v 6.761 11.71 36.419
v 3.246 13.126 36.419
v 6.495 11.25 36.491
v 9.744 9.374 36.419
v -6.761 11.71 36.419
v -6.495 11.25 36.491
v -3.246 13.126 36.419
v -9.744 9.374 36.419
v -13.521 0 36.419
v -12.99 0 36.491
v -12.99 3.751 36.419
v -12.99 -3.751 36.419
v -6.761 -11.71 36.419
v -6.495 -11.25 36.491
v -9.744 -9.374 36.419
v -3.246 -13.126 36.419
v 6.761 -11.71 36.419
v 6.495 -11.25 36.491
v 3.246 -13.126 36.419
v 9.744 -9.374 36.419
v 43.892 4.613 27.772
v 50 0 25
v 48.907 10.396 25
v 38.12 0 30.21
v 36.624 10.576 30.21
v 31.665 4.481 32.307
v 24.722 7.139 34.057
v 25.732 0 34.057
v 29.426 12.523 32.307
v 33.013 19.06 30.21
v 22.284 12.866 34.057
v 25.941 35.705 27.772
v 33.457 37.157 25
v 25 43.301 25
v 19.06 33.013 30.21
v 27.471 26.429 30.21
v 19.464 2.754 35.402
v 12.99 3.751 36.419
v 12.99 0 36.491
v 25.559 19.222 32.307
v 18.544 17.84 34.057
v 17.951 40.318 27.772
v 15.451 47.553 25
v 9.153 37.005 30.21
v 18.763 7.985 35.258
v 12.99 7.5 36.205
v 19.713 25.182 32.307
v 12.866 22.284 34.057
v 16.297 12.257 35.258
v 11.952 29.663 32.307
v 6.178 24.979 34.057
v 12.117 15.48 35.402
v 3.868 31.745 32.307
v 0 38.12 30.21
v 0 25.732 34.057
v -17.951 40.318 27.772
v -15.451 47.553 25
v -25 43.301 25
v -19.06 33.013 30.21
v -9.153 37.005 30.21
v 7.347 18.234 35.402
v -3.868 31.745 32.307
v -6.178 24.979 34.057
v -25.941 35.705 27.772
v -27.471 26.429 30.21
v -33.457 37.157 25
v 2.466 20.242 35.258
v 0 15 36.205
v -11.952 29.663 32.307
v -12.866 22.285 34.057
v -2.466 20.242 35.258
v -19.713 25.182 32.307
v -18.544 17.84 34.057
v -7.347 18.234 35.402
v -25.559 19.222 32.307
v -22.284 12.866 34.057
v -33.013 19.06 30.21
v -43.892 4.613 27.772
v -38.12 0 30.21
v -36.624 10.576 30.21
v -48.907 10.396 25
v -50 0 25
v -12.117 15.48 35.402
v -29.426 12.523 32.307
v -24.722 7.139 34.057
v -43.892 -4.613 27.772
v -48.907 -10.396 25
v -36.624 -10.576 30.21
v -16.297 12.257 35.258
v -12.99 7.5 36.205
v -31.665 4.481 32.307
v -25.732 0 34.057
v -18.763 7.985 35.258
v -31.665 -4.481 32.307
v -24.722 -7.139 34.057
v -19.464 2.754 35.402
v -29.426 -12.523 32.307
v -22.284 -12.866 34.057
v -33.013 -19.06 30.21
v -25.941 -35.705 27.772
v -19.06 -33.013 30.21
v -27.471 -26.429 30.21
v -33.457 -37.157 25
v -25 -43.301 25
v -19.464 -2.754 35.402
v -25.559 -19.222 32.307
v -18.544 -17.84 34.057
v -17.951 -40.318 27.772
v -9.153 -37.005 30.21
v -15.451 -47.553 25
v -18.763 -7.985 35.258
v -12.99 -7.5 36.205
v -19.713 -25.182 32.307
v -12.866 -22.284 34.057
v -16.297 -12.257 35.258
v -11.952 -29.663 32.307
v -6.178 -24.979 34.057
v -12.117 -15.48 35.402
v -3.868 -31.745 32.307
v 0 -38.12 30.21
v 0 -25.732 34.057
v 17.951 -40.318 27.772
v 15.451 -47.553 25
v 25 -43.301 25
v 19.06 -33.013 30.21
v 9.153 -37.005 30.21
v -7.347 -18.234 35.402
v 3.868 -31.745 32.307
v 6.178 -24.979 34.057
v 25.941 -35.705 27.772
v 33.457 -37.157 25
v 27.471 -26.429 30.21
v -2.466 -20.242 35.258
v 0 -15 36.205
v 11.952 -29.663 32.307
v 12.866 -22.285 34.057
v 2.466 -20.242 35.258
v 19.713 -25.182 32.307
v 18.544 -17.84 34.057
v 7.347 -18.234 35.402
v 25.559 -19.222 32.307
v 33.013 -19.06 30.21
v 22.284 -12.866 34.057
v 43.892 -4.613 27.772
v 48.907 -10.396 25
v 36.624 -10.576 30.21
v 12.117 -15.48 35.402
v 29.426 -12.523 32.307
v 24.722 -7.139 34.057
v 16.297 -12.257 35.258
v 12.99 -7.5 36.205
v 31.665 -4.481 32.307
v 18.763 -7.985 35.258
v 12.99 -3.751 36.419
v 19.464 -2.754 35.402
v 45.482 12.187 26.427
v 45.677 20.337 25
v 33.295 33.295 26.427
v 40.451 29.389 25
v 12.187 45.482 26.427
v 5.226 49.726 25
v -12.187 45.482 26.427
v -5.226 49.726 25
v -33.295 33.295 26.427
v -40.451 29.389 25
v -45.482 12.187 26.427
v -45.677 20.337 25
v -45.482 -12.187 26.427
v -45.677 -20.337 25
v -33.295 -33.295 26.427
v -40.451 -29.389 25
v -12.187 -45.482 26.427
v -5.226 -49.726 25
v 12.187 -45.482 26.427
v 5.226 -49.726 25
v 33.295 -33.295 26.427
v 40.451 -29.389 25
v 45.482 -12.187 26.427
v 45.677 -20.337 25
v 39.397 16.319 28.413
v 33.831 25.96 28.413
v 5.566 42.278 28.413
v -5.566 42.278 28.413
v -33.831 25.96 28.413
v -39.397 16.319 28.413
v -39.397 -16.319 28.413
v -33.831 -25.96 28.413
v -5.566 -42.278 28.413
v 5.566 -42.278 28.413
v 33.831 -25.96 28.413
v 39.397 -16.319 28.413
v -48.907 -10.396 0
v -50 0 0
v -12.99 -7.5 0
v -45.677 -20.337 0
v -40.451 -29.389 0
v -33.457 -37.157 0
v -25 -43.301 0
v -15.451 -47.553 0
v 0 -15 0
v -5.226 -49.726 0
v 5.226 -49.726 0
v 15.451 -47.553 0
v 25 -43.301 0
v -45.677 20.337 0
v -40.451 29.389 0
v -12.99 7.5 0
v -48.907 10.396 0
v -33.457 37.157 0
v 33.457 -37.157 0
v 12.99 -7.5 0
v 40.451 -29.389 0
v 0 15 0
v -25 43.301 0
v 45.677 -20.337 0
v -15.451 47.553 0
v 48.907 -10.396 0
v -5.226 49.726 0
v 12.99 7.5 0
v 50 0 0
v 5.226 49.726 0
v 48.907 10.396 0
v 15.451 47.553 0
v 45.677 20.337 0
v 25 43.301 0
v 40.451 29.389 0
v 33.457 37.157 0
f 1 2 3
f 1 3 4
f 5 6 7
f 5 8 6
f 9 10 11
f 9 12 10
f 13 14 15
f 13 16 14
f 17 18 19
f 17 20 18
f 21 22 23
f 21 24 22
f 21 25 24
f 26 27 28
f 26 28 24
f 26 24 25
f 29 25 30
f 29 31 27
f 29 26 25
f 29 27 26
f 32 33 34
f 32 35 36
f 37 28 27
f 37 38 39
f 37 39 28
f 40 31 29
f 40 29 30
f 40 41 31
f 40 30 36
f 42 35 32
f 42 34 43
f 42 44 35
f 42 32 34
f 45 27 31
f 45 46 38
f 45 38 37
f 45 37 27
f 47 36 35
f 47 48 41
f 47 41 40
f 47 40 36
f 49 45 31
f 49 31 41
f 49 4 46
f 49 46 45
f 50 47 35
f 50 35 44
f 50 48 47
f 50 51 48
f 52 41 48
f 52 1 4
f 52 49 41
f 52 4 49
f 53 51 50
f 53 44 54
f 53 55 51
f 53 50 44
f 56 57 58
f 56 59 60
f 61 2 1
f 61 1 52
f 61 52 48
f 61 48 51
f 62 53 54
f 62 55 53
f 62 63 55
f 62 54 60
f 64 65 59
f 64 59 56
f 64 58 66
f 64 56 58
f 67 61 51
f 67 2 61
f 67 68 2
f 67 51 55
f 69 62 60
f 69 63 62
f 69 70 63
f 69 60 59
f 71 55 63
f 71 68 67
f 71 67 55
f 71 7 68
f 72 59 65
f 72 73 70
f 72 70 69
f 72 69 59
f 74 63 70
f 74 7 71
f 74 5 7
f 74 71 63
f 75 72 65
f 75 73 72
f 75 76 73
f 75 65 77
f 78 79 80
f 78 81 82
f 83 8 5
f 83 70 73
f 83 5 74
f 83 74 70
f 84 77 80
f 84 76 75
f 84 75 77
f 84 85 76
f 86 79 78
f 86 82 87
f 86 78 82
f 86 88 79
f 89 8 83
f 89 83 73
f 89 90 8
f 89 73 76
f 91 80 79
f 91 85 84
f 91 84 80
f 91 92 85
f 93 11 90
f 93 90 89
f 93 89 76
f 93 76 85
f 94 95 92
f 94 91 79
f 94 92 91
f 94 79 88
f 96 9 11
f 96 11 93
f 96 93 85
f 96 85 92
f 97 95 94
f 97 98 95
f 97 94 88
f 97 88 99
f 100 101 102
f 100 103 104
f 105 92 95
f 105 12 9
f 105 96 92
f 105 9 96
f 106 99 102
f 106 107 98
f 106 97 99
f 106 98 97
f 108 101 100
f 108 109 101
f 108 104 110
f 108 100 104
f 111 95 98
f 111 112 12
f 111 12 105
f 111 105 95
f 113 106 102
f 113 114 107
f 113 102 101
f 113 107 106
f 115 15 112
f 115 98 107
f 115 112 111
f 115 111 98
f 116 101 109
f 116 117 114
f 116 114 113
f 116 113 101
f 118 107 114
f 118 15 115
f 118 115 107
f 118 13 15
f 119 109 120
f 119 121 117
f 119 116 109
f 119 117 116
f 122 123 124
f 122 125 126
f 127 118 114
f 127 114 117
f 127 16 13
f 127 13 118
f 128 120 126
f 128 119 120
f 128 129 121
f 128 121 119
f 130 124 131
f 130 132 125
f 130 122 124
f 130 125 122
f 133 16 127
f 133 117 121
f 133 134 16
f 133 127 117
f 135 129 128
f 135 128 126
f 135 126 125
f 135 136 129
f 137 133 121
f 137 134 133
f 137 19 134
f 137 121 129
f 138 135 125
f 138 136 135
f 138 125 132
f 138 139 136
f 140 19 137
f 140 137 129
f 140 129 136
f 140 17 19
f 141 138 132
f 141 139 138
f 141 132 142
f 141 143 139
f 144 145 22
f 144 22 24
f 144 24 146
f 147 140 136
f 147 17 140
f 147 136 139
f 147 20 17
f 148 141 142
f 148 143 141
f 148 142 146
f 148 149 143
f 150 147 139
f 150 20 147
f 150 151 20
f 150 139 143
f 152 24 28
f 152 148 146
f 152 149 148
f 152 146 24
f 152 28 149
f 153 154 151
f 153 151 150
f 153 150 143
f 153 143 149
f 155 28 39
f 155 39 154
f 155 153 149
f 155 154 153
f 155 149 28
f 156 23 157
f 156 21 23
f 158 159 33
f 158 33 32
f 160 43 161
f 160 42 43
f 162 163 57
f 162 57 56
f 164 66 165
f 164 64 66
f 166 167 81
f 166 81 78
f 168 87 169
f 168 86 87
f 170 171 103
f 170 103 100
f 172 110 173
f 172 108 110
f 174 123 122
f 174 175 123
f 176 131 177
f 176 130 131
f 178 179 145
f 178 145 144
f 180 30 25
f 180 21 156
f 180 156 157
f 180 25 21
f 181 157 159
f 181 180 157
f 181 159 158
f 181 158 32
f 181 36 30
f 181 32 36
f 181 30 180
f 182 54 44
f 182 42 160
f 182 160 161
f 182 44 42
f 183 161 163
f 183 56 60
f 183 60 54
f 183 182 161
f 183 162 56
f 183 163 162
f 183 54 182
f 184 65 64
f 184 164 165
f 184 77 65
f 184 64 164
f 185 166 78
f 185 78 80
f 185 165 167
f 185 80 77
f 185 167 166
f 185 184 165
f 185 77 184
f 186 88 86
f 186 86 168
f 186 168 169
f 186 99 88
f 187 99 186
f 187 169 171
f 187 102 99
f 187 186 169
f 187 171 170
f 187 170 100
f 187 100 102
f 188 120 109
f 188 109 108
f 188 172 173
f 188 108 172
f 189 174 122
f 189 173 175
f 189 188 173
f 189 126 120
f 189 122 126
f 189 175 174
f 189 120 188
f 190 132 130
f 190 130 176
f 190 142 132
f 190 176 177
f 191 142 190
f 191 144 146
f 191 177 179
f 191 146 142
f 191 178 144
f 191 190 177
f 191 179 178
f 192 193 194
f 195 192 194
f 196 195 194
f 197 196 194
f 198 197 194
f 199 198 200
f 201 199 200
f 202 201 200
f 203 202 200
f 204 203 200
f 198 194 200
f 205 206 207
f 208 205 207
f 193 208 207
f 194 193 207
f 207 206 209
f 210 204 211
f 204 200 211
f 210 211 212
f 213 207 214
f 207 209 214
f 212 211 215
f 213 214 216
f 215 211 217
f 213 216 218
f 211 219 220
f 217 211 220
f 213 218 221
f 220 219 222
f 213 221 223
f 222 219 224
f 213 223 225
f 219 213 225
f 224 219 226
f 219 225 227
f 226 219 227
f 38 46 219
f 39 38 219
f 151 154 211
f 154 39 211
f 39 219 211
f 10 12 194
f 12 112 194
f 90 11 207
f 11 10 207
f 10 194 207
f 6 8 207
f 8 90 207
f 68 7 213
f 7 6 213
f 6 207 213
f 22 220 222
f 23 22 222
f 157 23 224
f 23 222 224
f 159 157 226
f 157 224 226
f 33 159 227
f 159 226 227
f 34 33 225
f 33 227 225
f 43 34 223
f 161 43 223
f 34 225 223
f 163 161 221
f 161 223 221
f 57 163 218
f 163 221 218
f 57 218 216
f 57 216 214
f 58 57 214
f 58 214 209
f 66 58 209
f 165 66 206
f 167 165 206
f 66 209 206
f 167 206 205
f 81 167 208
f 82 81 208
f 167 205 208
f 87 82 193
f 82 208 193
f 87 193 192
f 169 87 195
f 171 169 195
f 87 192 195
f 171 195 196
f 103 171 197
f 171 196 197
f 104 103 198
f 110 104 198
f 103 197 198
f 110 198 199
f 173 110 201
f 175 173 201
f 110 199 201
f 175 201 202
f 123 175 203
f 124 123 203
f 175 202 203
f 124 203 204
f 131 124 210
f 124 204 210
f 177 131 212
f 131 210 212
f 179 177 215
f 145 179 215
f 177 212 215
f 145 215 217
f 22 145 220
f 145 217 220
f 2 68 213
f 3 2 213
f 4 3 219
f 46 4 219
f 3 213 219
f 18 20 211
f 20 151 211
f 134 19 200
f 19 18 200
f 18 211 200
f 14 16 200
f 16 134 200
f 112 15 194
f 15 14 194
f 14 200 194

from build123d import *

# Parameters (mm, degrees)
F0_R     = 50
F1_DEPTH = 25
F4_DEPTH = 12.4837433515


with BuildPart() as f1:
    # F0 (on Top) → F1 (new body)
    with BuildSketch(Plane.XY):
        Circle(F0_R)
        Polygon((-12.9903810568, 7.5), (0, 15), (12.9903810568, 7.5), (12.9903810568, -7.5), (0, -15), (-12.9903810568, -7.5), align=None, mode=Mode.SUBTRACT)
    extrude(amount=F1_DEPTH)

    # F2 (on Front) → F3 (revolve)
    with BuildSketch(Plane.XZ):
        with BuildLine():
            Line((0, 25), (50, 25))
            ThreePointArc((50, 25), (25.7045802551, 34.0635888294), (0, 37.4827432515))
            Line((0, 37.4827432515), (0, 25))
        make_face()
    revolve(axis=Axis((0, 0, 31.2413716258), (0, 0, 1)))

    # F4 (cut, through all): a face of the model
    f4_faces = [f1.faces().sort_by_distance(p)[0] for p in [
        (0, 0, 25),
    ]]
    extrude(f4_faces, amount=-F4_DEPTH, mode=Mode.SUBTRACT)


solid = f1.part
